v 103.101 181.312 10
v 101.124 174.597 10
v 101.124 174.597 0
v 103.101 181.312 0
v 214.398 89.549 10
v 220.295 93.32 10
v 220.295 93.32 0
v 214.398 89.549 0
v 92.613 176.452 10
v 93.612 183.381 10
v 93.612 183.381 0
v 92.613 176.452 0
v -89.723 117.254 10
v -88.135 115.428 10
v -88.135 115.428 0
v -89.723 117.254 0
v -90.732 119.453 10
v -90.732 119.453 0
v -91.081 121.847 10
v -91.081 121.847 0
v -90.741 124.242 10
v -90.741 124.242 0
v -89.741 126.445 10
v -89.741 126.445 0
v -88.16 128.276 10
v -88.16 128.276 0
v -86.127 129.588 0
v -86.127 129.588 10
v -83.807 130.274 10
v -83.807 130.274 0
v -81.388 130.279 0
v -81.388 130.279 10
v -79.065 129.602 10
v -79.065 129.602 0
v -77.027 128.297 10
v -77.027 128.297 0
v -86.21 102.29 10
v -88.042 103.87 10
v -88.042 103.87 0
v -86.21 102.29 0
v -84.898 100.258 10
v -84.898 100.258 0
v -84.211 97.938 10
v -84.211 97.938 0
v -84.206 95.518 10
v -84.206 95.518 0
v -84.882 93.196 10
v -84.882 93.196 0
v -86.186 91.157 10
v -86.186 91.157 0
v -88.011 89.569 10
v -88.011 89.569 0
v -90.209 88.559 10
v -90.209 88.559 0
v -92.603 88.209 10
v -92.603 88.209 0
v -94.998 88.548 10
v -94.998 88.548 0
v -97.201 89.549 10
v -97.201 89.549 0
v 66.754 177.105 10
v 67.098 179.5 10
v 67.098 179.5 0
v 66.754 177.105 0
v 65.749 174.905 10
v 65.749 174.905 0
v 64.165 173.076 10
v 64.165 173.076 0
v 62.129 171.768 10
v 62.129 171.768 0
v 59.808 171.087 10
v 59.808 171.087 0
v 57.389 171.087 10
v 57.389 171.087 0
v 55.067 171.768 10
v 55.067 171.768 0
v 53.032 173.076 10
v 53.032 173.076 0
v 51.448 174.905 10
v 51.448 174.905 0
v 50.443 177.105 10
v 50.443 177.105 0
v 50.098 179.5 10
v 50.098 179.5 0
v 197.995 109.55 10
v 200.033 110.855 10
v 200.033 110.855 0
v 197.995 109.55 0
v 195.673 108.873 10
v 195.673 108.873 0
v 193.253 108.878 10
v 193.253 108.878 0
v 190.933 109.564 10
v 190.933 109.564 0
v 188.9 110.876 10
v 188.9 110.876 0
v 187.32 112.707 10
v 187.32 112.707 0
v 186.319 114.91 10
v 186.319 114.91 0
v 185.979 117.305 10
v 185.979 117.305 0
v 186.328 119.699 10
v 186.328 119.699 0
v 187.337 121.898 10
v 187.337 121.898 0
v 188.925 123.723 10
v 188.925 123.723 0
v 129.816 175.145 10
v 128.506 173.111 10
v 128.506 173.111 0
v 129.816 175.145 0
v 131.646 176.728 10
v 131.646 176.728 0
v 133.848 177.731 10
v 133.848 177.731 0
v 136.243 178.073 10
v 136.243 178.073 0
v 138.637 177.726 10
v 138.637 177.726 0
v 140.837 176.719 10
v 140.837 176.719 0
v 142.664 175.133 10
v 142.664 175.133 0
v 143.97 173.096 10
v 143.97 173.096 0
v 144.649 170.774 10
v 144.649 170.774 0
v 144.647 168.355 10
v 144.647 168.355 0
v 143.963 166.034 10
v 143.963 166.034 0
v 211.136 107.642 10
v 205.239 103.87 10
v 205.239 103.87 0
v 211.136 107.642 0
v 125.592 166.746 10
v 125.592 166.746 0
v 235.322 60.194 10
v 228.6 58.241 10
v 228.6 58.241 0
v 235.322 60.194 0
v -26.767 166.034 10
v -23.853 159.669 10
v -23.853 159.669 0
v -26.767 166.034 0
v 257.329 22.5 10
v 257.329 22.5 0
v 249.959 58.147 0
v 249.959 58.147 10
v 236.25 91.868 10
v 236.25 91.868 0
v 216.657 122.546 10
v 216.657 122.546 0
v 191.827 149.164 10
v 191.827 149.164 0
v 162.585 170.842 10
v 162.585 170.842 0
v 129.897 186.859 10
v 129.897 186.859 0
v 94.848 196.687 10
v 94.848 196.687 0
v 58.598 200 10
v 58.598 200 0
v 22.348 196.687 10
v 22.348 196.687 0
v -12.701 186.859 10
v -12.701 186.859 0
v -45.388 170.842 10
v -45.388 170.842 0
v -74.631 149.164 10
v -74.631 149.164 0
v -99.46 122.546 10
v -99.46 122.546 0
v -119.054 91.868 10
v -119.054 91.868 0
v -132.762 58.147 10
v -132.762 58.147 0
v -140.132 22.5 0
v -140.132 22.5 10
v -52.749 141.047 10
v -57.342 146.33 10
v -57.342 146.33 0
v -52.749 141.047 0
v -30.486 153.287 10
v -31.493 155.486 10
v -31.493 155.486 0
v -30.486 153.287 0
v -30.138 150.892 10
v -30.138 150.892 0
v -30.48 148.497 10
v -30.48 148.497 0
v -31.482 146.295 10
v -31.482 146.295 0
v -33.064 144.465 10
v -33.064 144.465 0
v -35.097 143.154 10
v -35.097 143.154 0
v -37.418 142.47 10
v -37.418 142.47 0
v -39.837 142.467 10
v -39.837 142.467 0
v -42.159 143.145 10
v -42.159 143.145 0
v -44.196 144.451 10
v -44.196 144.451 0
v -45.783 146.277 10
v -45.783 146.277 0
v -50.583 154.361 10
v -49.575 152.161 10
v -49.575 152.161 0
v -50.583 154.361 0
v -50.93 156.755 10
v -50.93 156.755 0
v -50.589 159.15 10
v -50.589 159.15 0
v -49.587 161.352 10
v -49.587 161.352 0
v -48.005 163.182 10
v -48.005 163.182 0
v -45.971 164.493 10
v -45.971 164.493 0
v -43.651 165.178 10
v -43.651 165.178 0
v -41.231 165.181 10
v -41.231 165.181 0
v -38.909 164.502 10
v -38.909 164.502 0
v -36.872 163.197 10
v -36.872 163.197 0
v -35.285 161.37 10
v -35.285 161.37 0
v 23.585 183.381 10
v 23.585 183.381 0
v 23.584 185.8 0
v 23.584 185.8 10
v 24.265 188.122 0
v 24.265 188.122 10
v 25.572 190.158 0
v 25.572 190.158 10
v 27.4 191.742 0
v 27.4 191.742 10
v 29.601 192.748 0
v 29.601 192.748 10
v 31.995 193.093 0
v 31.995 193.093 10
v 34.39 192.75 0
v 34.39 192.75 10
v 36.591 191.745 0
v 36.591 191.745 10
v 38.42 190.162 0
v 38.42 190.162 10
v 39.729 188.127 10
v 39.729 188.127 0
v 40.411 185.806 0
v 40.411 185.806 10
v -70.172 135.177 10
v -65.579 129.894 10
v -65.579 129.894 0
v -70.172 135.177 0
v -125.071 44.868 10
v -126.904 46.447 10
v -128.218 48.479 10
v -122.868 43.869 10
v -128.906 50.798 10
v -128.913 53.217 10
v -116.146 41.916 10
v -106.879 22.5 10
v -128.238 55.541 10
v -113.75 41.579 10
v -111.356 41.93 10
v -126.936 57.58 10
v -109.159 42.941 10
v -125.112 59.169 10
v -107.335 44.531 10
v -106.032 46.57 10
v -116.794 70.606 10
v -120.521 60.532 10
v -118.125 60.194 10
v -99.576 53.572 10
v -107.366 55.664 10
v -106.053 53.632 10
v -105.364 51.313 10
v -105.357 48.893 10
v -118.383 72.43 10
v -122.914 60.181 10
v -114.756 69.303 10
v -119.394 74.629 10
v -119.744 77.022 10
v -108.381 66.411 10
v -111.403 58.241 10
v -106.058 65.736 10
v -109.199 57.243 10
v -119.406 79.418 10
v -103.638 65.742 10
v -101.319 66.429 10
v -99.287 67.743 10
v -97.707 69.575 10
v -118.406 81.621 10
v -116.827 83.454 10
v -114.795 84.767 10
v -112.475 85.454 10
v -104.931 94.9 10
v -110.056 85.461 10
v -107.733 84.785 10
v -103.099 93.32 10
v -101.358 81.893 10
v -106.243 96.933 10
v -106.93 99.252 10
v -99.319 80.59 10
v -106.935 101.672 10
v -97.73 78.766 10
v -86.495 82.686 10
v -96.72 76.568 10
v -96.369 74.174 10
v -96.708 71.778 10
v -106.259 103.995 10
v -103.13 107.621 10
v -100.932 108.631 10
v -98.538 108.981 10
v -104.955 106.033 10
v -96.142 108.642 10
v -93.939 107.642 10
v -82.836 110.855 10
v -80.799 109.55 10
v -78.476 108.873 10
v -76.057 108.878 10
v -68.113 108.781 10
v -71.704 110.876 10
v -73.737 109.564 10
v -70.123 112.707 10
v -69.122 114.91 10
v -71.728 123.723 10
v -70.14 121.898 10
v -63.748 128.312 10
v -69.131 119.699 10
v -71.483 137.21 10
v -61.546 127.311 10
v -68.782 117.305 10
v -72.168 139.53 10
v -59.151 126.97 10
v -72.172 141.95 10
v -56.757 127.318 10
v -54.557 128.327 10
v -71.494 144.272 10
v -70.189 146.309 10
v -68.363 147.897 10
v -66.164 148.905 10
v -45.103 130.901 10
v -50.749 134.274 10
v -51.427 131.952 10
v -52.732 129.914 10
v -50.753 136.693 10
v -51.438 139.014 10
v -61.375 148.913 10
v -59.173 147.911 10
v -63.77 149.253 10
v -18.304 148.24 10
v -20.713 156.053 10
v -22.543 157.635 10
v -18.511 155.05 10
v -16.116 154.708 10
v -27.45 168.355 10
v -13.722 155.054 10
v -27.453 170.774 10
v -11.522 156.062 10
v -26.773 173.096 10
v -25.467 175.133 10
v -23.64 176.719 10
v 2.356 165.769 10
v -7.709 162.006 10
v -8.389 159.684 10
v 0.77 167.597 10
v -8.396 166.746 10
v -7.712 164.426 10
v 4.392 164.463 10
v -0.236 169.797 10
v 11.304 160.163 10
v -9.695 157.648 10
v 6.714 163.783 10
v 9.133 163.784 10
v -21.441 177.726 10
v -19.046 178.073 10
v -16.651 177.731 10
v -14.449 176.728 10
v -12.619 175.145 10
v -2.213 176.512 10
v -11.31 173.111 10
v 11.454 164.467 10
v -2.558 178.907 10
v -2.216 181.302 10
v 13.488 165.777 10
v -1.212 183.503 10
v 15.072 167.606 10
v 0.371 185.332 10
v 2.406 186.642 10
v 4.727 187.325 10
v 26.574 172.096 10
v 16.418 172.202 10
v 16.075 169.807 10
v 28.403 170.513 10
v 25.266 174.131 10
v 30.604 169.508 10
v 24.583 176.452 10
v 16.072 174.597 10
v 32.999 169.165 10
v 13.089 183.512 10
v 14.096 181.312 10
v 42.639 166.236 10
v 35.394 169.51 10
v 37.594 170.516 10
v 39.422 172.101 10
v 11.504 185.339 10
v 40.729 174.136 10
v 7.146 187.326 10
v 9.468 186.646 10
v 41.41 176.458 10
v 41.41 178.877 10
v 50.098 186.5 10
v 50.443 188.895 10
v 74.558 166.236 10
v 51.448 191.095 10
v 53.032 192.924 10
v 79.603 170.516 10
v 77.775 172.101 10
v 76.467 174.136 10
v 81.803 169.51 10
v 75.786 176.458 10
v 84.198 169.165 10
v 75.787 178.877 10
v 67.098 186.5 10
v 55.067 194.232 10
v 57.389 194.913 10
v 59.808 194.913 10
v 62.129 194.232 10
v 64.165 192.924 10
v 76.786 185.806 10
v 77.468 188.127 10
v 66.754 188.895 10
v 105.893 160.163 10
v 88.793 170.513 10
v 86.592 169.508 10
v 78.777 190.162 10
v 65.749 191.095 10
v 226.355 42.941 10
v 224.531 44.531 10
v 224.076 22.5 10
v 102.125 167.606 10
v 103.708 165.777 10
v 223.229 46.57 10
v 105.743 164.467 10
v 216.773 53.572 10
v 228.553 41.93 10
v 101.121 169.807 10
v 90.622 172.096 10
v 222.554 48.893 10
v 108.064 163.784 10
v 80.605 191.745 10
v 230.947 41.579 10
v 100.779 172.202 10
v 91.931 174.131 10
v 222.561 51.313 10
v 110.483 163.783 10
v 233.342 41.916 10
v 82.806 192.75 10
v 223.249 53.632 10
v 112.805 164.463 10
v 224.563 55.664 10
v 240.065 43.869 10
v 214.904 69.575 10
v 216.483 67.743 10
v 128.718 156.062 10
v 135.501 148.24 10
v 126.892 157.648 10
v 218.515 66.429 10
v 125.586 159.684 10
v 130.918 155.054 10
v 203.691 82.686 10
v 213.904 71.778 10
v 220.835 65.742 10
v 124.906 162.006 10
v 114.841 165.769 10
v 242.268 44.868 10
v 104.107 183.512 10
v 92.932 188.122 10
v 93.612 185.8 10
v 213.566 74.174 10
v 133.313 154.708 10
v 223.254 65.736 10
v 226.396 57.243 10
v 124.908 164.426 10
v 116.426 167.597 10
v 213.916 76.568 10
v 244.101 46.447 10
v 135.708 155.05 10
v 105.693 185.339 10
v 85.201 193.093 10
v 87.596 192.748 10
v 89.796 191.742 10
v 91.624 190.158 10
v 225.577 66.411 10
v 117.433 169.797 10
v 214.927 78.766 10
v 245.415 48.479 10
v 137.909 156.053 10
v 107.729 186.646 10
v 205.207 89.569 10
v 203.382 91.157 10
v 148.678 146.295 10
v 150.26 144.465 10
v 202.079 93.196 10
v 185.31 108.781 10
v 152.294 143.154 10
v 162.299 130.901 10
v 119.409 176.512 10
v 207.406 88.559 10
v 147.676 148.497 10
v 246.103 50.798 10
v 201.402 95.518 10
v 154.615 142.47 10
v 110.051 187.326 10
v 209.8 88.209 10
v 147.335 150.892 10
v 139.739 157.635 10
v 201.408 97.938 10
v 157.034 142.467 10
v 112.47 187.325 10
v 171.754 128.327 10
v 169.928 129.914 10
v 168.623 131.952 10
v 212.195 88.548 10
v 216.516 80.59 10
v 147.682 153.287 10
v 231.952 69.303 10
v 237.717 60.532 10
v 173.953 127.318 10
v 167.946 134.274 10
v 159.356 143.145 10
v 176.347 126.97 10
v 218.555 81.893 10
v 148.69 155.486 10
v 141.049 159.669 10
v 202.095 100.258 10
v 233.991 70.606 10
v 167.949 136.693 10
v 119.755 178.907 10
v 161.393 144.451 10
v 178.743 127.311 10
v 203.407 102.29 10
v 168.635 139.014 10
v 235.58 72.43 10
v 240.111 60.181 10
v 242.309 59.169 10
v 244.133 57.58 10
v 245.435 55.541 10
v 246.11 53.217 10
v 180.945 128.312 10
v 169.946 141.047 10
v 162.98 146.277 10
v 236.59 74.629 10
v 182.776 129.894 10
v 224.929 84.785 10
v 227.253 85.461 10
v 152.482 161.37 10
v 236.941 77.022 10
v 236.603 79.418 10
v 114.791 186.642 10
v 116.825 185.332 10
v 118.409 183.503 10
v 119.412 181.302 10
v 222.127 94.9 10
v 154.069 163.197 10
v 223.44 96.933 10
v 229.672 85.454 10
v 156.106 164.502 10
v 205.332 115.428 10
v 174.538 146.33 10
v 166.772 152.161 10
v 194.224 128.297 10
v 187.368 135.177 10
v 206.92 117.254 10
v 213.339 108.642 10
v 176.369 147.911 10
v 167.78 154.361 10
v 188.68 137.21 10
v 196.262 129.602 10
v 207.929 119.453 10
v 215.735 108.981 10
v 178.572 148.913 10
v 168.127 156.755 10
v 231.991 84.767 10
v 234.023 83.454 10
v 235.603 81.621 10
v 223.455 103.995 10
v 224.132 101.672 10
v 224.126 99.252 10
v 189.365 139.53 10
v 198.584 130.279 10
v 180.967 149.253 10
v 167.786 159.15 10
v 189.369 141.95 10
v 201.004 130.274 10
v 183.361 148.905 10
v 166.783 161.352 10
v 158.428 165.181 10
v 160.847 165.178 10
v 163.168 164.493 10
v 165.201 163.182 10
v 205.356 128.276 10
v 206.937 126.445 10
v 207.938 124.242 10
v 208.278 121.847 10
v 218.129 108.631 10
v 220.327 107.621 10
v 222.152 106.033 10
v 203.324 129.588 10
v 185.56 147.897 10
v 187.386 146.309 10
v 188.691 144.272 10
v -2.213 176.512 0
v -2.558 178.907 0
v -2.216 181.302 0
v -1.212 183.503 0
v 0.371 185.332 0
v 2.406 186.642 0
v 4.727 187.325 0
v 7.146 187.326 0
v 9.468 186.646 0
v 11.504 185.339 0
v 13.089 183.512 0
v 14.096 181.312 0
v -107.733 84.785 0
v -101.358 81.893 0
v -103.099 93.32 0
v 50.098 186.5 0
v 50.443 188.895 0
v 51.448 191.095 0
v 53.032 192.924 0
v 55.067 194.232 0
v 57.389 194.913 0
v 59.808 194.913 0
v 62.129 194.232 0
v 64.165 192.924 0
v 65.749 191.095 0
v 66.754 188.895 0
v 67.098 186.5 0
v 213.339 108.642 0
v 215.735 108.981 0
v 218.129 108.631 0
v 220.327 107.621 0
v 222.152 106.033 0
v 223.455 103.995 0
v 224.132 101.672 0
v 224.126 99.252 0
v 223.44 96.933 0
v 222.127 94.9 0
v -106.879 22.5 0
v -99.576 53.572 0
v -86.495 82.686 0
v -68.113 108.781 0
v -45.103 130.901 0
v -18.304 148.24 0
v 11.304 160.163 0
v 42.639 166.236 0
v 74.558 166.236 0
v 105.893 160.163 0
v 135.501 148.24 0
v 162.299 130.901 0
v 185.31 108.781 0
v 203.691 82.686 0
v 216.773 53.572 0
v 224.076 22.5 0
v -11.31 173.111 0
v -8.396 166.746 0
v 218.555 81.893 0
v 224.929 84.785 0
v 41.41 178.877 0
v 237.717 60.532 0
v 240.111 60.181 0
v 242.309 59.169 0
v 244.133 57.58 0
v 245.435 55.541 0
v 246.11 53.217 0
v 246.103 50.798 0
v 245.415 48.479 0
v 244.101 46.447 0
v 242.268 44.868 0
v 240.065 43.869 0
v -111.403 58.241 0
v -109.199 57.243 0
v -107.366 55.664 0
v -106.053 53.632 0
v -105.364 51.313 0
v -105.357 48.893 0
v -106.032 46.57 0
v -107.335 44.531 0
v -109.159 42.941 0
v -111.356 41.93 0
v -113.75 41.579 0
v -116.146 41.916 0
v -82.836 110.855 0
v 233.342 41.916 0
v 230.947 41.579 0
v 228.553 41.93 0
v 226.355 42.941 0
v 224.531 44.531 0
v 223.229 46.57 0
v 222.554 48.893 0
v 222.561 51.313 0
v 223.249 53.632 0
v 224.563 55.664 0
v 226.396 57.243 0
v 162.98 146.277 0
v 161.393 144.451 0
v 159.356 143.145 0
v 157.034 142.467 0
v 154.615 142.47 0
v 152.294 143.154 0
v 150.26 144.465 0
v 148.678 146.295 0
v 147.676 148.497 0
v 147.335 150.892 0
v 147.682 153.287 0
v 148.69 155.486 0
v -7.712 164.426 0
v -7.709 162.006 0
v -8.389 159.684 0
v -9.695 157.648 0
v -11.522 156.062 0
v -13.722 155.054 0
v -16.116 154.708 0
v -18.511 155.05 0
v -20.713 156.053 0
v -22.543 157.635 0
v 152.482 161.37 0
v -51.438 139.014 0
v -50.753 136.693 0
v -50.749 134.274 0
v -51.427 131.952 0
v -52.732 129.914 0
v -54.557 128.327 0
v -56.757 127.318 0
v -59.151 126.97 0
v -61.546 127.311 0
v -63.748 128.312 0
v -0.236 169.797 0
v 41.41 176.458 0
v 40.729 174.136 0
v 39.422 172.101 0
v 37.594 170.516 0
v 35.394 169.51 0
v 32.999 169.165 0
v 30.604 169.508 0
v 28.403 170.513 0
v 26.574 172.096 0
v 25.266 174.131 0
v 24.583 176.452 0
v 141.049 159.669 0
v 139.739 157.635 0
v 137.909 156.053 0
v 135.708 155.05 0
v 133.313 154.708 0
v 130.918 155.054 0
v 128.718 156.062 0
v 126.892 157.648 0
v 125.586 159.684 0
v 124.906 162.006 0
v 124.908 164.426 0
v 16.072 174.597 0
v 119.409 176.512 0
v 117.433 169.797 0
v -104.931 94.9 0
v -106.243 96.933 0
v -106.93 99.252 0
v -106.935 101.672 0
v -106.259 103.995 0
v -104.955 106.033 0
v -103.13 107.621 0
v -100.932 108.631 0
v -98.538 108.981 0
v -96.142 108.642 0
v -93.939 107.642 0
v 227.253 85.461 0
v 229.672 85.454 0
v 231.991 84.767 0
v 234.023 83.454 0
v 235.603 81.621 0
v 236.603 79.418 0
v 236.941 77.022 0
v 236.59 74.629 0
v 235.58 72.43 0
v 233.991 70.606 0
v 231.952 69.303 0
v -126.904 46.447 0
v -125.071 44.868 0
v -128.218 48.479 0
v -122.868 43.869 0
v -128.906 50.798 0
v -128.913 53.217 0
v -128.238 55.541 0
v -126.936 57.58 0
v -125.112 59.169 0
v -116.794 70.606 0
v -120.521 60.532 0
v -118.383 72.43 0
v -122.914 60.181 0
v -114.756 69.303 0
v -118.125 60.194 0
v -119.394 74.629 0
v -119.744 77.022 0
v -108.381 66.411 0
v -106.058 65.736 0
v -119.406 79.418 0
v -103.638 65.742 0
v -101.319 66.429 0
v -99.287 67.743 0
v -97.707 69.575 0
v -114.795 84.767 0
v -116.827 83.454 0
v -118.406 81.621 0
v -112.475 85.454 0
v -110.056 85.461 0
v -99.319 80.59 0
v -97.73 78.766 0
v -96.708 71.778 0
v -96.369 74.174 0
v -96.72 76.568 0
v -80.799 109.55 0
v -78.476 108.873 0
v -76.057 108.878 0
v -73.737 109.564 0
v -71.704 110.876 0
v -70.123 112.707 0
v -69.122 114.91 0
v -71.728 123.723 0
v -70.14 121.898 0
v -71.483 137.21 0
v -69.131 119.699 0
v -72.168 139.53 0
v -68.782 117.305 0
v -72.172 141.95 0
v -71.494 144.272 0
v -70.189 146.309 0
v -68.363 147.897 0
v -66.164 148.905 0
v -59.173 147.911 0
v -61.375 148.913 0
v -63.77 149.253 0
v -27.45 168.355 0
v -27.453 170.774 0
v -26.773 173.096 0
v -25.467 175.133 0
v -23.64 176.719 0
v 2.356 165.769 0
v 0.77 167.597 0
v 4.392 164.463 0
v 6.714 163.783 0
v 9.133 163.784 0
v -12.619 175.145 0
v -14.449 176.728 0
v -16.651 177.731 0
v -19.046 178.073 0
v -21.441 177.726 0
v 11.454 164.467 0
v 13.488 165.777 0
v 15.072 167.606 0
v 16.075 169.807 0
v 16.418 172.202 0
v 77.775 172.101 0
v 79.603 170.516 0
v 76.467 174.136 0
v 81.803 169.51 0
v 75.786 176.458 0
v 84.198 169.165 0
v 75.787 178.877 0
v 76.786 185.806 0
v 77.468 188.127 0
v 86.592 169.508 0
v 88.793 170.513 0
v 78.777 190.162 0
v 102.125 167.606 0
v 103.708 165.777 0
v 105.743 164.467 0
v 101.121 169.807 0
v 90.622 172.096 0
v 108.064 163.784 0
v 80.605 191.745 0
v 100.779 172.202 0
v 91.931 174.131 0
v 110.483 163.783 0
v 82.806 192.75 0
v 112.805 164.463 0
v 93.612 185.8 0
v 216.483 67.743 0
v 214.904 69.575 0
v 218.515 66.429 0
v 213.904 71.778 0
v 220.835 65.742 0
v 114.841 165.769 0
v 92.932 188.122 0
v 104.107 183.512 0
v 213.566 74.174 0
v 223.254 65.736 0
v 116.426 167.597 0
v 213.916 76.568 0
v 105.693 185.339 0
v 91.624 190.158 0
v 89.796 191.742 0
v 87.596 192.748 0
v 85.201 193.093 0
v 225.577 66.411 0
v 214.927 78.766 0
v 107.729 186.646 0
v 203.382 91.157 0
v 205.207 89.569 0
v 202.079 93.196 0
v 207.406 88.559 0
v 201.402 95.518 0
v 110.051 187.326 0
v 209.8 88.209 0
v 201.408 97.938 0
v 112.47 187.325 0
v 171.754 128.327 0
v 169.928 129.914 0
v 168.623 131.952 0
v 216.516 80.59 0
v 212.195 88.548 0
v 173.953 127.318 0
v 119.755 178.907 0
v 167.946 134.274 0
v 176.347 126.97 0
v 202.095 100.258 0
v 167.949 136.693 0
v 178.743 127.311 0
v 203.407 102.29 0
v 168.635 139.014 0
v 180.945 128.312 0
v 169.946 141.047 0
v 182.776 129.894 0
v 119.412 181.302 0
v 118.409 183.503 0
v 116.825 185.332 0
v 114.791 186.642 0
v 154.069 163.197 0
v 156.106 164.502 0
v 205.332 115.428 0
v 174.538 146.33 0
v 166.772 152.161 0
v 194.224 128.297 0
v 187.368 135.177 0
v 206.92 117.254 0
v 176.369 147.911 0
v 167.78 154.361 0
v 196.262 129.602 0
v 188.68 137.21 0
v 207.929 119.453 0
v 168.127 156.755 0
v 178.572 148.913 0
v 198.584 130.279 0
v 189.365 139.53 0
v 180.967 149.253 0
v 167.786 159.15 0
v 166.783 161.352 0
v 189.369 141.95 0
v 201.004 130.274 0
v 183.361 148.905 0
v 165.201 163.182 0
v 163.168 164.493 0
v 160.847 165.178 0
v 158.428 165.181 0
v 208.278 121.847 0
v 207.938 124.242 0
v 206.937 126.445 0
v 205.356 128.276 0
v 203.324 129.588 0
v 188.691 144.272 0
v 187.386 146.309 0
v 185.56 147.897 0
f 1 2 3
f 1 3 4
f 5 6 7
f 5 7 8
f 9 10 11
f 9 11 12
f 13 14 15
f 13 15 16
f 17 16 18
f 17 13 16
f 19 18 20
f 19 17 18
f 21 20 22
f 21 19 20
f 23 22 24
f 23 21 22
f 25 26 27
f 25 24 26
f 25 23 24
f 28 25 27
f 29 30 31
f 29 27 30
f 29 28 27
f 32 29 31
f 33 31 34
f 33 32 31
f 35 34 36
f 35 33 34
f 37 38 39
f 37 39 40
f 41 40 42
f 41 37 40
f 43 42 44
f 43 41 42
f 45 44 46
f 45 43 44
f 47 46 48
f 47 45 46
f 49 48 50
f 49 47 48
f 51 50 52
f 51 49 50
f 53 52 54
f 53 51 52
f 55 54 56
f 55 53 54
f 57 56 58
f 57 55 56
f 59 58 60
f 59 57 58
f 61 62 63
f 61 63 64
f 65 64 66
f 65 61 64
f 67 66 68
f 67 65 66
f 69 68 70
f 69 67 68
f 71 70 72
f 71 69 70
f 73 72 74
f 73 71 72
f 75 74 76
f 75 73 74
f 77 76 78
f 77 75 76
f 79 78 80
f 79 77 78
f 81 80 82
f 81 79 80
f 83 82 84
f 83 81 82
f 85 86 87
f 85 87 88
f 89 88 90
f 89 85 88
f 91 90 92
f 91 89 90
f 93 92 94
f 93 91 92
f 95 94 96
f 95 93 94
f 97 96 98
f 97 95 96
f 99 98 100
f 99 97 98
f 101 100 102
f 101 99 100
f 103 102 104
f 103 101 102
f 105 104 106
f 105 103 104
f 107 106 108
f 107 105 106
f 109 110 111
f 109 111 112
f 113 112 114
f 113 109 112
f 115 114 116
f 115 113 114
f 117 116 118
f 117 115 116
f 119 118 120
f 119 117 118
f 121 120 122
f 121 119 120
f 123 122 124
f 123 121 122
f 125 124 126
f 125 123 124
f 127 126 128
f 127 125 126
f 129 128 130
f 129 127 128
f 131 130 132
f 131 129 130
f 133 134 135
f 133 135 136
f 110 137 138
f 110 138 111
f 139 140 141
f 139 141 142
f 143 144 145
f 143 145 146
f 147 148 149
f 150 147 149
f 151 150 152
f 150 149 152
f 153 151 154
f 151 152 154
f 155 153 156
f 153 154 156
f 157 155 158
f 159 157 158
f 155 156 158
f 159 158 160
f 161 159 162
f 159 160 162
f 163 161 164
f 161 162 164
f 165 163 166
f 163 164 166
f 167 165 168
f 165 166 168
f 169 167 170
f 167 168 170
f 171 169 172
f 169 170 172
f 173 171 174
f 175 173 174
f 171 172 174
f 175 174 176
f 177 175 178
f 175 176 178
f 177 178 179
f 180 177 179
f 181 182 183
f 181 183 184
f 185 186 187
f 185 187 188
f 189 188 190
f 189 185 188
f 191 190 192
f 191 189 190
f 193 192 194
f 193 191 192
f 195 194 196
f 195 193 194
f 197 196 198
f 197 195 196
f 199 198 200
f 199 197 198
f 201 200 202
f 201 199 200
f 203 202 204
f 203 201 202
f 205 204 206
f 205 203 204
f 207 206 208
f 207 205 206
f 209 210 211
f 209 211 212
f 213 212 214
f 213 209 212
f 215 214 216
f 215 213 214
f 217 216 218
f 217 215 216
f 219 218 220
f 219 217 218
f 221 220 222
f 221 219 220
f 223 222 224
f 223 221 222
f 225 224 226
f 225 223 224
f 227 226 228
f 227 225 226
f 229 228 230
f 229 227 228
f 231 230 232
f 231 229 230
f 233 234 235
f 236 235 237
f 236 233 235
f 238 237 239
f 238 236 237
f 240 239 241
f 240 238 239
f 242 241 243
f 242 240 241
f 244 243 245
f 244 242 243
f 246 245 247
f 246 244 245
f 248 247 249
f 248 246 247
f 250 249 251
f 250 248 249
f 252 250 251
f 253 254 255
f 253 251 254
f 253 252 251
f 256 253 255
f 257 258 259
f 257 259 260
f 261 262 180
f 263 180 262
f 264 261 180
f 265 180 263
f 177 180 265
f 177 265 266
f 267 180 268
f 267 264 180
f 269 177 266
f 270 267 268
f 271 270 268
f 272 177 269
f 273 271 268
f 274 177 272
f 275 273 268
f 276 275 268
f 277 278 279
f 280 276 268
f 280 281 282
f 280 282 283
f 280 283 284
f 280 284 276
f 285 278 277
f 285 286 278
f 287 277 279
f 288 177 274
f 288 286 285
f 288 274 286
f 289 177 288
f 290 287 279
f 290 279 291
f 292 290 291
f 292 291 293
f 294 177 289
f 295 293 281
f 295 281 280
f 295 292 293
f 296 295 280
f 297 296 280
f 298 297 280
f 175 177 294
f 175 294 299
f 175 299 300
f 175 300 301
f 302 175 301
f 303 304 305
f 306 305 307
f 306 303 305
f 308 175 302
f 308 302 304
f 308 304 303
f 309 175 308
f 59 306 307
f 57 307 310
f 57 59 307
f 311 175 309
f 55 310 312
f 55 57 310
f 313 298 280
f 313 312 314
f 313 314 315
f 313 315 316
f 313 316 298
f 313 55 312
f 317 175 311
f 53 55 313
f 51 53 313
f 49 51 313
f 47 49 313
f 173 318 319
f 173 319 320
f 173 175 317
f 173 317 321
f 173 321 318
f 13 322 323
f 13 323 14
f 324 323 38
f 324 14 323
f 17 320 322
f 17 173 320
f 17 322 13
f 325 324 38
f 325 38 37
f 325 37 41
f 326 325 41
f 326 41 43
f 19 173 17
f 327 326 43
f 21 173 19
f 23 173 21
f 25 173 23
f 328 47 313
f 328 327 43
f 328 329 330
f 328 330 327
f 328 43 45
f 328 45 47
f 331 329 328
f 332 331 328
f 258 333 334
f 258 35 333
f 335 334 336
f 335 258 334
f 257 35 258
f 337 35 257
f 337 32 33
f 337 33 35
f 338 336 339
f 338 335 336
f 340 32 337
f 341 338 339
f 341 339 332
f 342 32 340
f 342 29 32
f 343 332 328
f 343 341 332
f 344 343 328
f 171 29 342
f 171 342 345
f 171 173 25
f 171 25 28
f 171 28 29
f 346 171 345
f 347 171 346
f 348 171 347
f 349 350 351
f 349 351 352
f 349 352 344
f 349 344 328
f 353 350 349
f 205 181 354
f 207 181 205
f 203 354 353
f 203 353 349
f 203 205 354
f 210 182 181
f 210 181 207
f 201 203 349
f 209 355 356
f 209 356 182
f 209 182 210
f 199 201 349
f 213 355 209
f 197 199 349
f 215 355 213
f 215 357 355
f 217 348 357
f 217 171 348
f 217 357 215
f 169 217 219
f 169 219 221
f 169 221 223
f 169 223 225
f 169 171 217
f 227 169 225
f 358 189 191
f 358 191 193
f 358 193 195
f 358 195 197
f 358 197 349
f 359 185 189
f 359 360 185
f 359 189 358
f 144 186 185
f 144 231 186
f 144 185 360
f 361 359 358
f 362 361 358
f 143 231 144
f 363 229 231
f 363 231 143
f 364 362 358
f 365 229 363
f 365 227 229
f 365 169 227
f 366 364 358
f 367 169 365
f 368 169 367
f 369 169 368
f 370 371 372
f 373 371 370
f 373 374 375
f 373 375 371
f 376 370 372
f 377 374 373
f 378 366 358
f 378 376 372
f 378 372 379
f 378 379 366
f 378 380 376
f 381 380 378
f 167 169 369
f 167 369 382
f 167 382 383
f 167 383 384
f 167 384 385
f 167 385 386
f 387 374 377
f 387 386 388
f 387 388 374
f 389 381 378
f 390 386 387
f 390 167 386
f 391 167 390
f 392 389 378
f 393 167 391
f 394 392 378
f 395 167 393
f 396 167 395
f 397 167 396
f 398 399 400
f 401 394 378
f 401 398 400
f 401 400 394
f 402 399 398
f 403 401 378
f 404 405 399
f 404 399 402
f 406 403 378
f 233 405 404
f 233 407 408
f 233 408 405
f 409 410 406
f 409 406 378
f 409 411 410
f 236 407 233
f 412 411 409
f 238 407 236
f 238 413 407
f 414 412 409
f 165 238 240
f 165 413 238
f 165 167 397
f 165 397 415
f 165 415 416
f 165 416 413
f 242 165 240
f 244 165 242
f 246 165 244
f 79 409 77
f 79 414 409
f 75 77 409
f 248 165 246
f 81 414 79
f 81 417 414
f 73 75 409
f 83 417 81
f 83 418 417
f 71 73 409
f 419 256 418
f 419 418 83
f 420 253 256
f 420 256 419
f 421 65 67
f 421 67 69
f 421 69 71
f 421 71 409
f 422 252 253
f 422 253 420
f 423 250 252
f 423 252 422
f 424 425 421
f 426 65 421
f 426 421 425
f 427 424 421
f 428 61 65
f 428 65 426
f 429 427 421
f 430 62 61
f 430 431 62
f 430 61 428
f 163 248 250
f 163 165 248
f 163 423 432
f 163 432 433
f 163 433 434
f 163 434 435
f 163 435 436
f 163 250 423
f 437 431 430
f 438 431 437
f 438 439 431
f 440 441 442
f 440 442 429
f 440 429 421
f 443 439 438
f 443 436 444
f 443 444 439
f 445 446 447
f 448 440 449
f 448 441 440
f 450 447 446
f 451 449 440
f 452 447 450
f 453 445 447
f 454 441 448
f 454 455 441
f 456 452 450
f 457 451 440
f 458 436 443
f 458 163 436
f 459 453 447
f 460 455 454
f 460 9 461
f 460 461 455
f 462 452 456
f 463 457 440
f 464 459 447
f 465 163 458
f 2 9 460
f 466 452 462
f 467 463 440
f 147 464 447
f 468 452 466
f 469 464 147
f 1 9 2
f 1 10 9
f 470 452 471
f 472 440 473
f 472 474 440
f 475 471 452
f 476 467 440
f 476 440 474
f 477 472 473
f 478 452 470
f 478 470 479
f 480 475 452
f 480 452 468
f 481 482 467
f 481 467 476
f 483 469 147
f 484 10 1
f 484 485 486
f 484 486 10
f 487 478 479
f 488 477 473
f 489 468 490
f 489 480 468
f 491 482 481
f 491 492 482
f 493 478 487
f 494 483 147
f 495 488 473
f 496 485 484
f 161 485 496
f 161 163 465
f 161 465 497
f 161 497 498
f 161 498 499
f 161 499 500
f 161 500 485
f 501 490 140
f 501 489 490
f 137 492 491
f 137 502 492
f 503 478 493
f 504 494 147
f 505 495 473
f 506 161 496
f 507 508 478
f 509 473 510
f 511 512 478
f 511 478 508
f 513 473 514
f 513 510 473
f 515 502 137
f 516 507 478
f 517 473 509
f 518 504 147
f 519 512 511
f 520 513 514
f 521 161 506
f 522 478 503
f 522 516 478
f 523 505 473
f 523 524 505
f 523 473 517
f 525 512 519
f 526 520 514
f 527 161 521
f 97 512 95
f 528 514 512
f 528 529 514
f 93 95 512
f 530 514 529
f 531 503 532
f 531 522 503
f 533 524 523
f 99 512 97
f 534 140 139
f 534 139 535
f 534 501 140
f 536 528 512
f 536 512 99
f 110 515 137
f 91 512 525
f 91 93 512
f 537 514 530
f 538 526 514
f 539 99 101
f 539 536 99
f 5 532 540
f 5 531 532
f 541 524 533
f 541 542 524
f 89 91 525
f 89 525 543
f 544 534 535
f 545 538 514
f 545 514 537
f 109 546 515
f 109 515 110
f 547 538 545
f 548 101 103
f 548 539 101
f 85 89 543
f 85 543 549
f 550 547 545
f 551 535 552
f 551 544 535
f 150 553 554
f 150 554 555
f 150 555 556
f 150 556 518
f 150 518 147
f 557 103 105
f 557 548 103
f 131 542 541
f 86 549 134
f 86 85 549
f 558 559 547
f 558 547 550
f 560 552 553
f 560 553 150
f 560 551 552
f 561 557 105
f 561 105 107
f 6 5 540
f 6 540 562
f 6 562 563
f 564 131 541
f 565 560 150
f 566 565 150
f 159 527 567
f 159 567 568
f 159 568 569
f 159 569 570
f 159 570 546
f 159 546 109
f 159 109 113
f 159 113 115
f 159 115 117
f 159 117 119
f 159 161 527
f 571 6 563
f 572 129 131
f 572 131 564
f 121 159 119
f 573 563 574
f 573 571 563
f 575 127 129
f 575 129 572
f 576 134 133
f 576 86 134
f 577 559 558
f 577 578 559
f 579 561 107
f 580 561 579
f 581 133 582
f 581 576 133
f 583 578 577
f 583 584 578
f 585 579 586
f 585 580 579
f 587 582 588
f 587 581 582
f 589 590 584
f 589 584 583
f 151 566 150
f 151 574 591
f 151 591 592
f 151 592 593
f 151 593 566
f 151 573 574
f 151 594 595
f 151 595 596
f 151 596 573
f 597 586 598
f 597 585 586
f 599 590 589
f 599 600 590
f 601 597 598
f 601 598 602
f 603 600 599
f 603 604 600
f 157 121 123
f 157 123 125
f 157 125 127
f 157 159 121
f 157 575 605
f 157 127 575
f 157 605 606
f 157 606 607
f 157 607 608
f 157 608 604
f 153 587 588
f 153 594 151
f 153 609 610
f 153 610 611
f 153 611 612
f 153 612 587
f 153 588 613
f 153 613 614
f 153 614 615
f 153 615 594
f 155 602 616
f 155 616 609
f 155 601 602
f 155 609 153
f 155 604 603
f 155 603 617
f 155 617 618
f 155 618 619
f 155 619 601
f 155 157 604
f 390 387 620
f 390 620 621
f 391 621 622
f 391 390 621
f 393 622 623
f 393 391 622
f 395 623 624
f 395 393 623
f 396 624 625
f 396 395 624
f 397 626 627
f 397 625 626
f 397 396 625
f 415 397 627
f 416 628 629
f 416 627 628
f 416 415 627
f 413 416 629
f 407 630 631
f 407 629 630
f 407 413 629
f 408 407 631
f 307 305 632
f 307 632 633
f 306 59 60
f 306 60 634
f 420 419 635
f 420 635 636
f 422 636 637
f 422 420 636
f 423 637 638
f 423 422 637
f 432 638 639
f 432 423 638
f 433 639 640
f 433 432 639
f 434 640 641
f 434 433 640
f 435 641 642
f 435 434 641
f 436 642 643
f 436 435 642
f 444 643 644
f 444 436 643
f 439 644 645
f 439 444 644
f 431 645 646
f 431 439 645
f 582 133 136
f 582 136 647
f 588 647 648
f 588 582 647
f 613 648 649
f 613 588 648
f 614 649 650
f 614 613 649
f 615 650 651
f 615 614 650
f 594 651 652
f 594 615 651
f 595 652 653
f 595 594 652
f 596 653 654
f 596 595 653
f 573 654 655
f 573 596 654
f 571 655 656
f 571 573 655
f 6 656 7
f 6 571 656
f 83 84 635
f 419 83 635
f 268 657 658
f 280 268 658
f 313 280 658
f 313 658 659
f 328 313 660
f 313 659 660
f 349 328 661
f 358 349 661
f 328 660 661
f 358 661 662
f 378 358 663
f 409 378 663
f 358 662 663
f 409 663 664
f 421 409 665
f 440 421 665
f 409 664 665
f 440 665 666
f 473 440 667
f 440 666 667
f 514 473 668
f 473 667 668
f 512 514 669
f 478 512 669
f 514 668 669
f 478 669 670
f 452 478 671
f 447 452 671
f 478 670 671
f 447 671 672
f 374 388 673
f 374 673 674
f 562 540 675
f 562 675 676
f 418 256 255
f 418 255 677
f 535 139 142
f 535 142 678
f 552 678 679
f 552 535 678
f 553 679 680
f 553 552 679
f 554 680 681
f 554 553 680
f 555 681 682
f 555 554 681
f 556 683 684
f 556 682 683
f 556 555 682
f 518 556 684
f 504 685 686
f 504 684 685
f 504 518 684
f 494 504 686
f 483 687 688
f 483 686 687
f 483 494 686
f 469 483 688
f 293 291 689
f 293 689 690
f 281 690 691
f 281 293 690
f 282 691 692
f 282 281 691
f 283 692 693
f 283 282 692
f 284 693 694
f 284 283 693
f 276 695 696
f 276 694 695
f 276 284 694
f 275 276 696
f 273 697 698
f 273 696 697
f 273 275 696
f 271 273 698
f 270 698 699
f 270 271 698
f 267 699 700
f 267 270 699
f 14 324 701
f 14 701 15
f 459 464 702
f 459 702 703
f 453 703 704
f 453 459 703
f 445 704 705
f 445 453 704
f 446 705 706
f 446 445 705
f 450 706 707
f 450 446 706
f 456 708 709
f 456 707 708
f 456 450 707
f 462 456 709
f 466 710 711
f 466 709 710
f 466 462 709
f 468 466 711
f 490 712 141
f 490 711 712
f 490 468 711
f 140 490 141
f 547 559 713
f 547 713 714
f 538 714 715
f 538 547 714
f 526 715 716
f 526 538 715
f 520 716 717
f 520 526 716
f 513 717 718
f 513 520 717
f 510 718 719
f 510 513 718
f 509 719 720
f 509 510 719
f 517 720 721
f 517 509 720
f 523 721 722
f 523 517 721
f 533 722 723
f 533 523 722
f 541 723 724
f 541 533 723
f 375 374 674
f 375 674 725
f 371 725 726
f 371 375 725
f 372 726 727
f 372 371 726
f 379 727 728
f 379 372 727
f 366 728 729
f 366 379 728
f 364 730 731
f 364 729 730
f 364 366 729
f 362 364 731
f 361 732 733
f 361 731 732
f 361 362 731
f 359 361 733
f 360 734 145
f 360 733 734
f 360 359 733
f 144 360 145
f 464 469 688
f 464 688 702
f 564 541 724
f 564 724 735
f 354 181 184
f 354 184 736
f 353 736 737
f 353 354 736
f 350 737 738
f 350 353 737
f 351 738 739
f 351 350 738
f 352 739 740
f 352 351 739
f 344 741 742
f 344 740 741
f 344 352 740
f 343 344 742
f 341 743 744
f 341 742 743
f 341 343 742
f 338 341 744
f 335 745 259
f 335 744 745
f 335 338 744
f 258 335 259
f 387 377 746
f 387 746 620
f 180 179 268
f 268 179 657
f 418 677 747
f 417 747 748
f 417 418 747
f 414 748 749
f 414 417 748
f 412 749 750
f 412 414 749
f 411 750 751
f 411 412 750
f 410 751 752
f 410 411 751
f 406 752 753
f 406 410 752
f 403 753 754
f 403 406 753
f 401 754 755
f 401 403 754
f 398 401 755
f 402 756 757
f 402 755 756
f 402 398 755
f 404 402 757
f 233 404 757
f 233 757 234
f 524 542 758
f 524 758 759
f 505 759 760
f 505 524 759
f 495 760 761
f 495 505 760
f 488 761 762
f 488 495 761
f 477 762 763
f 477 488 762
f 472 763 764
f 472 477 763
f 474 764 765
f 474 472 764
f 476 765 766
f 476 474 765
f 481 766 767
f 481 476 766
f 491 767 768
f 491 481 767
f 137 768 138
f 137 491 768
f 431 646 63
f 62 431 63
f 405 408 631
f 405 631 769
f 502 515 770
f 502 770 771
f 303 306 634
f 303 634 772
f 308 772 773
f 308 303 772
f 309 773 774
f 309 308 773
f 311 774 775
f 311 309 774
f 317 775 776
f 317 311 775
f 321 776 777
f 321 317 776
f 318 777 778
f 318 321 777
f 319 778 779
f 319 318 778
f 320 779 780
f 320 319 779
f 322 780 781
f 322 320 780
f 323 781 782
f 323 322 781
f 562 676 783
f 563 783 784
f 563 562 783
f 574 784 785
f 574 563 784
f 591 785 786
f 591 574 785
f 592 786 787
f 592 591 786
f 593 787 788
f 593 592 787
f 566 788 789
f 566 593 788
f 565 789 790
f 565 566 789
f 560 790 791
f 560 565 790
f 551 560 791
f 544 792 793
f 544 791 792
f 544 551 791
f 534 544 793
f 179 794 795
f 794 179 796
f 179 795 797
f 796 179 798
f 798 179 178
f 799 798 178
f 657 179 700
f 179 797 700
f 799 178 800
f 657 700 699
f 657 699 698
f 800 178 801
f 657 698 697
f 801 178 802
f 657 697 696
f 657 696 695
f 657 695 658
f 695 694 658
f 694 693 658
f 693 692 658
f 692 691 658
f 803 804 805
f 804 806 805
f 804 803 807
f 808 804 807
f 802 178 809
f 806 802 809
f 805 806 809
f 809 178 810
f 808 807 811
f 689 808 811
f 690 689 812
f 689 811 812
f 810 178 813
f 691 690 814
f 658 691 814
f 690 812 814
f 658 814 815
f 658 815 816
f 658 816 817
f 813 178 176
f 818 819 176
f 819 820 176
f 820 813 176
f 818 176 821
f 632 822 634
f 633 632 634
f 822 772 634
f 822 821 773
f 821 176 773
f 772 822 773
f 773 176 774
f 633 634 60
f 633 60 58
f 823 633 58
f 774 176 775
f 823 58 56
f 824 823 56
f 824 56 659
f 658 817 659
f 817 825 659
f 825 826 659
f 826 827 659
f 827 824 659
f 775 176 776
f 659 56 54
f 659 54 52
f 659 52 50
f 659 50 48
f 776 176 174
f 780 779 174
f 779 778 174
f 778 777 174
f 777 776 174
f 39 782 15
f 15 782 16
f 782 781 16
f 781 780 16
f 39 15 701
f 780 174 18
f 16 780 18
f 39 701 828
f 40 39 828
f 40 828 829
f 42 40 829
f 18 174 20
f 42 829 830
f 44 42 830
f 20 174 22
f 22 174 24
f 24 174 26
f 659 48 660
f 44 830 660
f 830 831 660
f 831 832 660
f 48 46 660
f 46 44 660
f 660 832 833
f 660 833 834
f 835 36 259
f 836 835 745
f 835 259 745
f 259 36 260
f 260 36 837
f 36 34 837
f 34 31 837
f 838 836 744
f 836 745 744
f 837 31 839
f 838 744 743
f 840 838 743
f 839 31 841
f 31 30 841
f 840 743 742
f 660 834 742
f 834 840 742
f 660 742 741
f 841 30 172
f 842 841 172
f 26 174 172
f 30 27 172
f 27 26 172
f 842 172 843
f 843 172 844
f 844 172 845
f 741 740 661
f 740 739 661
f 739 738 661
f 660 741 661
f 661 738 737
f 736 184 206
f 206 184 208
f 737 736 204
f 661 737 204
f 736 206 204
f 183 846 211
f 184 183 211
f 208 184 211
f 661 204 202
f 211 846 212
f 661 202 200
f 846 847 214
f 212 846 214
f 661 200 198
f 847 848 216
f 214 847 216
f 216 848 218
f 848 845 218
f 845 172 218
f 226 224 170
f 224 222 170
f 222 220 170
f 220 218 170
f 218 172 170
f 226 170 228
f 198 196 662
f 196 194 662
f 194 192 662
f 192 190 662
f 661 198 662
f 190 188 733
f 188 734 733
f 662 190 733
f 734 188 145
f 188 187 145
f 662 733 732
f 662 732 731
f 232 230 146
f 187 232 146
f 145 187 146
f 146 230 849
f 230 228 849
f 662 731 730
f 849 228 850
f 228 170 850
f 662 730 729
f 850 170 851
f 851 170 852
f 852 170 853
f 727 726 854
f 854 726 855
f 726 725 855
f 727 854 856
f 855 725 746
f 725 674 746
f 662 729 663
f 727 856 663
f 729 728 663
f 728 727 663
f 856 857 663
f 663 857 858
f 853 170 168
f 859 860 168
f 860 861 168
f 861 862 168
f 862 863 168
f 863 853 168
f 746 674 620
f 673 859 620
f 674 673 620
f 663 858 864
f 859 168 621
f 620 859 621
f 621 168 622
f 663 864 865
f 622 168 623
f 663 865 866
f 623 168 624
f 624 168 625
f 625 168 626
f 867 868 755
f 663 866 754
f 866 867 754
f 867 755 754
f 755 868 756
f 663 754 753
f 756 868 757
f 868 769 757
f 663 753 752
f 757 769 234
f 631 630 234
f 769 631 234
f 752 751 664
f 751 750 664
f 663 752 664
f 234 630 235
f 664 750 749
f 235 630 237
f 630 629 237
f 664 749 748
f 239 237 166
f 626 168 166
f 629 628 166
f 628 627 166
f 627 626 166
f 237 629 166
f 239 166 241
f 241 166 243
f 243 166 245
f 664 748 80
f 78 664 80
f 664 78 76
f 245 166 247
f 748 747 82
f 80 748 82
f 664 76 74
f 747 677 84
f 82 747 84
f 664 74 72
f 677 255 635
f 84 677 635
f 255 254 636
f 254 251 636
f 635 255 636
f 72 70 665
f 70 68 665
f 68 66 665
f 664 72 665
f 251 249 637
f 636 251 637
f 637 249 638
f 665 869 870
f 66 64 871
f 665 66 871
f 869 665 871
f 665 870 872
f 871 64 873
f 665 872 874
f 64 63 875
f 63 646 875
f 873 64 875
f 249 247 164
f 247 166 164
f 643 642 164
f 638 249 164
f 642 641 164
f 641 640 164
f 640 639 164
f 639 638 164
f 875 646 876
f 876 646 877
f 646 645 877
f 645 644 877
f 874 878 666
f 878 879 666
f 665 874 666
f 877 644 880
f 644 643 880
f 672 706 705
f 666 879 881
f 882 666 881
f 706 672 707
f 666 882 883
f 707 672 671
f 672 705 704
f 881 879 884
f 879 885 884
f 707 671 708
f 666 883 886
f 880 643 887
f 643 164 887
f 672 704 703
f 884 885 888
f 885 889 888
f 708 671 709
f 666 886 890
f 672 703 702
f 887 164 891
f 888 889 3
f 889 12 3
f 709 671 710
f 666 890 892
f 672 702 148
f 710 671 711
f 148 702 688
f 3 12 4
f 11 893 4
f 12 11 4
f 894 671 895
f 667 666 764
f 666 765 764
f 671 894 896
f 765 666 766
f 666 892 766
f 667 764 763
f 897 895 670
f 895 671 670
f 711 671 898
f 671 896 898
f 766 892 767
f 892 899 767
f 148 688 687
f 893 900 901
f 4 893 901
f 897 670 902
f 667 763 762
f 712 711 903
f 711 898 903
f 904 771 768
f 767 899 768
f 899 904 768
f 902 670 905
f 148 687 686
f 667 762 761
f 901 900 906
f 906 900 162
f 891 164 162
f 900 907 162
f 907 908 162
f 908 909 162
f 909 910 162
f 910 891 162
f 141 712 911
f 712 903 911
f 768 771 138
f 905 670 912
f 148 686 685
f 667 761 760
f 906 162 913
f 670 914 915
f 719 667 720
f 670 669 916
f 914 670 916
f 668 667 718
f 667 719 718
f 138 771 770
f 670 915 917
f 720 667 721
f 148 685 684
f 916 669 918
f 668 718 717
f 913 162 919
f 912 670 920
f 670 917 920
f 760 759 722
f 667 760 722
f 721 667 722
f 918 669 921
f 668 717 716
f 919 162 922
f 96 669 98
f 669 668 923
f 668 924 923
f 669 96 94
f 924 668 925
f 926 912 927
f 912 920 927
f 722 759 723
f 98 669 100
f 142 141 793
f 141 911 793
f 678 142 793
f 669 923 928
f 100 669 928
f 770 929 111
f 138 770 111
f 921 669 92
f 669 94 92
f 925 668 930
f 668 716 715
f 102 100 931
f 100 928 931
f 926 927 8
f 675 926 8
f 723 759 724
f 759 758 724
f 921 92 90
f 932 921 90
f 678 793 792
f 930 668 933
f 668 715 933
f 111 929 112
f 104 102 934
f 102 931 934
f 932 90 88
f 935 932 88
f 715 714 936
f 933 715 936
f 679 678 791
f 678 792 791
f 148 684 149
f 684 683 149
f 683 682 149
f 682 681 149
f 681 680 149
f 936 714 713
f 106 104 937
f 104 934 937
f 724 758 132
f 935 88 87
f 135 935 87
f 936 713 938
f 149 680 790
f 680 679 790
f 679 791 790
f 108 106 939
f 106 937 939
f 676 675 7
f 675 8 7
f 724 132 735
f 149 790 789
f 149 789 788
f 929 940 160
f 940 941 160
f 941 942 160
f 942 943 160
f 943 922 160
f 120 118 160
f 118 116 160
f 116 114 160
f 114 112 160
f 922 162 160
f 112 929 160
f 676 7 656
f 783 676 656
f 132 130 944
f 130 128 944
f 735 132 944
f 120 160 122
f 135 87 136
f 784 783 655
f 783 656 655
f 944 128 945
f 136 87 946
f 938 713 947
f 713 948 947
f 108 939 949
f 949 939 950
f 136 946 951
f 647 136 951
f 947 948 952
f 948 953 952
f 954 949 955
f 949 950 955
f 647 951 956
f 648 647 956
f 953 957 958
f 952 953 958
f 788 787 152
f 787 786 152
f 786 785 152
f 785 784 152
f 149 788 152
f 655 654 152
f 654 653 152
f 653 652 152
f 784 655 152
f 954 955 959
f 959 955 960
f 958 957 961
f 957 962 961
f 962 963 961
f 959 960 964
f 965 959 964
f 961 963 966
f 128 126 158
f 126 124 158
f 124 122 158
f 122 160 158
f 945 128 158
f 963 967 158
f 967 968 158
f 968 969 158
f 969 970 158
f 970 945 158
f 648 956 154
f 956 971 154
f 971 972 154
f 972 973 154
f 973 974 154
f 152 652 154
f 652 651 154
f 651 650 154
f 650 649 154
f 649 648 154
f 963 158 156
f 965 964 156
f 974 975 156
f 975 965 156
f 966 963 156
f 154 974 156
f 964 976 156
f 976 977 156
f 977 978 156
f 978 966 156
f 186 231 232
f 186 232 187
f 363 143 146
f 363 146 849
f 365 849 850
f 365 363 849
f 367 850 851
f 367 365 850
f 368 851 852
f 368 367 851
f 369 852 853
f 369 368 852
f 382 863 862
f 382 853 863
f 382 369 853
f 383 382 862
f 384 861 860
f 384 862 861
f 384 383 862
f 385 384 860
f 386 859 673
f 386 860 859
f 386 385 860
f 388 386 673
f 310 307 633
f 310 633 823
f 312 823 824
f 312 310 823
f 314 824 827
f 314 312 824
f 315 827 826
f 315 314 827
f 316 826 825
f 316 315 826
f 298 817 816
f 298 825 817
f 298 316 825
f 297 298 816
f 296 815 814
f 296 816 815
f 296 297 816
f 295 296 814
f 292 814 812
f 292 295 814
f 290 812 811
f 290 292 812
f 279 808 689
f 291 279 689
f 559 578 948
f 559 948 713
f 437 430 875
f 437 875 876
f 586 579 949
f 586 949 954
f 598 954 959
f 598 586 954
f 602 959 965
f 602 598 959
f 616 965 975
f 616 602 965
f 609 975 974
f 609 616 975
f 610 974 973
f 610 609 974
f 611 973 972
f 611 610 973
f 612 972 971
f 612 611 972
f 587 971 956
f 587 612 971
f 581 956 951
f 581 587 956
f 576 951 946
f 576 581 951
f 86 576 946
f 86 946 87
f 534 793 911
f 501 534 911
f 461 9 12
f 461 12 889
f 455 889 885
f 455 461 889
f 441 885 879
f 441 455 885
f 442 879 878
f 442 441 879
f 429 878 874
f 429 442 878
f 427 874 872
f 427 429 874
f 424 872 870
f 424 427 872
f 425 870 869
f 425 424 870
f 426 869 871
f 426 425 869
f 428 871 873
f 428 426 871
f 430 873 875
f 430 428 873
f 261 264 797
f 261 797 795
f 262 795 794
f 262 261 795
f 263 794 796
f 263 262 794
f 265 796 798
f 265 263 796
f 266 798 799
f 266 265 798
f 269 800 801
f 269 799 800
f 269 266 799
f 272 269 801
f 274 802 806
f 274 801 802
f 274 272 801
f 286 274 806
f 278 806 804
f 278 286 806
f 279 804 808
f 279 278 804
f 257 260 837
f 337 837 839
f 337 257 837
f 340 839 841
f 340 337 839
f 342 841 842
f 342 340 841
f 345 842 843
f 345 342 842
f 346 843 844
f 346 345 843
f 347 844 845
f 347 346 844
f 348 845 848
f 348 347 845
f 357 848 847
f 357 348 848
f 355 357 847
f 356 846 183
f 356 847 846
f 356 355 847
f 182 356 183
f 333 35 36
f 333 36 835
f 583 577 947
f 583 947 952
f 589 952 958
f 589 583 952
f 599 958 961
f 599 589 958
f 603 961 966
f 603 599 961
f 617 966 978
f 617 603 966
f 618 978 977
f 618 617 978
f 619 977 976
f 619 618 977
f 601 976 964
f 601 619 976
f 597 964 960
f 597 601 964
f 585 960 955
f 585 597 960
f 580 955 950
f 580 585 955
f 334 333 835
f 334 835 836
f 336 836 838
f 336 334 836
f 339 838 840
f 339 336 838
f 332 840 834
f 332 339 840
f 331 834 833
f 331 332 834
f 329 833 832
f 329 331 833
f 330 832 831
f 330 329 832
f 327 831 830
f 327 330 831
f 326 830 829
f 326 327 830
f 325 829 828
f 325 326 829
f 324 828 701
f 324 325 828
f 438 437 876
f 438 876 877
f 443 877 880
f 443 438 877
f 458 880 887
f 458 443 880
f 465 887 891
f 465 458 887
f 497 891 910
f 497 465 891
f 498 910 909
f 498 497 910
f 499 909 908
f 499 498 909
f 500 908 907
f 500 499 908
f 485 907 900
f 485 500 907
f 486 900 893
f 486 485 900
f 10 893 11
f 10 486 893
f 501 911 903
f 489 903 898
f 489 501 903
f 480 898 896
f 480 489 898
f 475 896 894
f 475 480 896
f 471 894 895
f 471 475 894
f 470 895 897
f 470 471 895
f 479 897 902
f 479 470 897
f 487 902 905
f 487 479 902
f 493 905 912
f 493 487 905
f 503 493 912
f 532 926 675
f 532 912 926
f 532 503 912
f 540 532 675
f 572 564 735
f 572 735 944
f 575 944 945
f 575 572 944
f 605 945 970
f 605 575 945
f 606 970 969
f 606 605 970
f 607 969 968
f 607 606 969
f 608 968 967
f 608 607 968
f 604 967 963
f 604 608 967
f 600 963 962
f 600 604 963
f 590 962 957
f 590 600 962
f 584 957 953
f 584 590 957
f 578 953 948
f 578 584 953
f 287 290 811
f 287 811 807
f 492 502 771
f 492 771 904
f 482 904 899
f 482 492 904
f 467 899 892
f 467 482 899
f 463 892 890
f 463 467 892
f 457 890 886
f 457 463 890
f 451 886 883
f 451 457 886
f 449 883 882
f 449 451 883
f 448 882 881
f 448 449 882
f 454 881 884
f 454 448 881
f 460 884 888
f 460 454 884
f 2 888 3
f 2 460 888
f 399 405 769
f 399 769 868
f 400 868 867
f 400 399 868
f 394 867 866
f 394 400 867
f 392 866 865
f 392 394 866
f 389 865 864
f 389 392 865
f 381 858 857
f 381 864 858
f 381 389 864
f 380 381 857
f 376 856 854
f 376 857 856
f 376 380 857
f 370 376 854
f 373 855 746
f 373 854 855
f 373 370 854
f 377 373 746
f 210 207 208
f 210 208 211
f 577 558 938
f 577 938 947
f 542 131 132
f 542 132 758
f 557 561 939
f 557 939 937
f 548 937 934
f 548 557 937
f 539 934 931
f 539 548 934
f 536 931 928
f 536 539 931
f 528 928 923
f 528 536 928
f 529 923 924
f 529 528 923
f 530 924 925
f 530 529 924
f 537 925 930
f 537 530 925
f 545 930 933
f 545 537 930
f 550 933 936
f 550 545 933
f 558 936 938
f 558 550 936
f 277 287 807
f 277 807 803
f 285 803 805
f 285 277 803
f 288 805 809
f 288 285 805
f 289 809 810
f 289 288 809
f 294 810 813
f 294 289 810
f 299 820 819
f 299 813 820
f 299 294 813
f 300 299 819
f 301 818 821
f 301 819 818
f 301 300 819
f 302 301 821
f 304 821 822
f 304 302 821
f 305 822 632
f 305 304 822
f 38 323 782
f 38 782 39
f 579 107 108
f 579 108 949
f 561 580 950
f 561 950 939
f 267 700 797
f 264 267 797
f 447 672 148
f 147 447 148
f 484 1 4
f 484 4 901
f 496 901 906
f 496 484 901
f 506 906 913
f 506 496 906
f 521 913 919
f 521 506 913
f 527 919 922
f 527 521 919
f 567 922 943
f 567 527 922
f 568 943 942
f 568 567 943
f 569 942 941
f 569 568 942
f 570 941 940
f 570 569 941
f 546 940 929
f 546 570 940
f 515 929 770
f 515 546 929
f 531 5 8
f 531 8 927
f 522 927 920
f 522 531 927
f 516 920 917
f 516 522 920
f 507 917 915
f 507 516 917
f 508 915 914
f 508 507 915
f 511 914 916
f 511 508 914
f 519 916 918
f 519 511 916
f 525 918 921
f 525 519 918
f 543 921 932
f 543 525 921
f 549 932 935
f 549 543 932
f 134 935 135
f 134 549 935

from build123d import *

# Parameters (mm, degrees)
BOSS_EXTRU_1_DEPTH           = 10
ENL_V_MAT_EXTRU_1_DEPTH      = 11
R_P_TITION_CIRCULAIRE1_COUNT = 10
R_P_TITION_CIRCULAIRE1_ANGLE = 73.8
R_P_TITION_CIRCULAIRE2_COUNT = 10
R_P_TITION_CIRCULAIRE2_ANGLE = 73.8


with BuildPart() as part:
    # Esquisse1 → Boss.-Extru.1 (new body)
    with BuildSketch(Plane.XY):
        with BuildLine():
            Line((-140.132008959, 22.5), (-106.879003857, 22.5))
            ThreePointArc((-106.879003857, 22.5), (58.598335981, 167), (224.07567582, 22.5))
            Line((224.07567582, 22.5), (257.328680921, 22.5))
            ThreePointArc((257.328680921, 22.5), (58.598335981, 200), (-140.132008959, 22.5))
        make_face()
    extrude(amount=BOSS_EXTRU_1_DEPTH)

    # Esquisse2 → Enlèv. mat.-Extru.1 (cut, through all)
    with BuildSketch(Plane.XY.offset(10)):
        with BuildLine():
            Line((50.098335981, 179.5), (50.098335981, 186.5))
            ThreePointArc((50.098335981, 186.5), (58.598335981, 195), (67.098335981, 186.5))
            Line((67.098335981, 186.5), (67.098335981, 179.5))
            ThreePointArc((67.098335981, 179.5), (58.598335981, 171), (50.098335981, 179.5))
        make_face()
    enl_v_mat_extru_1 = extrude(amount=-ENL_V_MAT_EXTRU_1_DEPTH, mode=Mode.SUBTRACT)

    # Répétition circulaire1: Enlèv. mat.-Extru.1 ×10 about axis
    r_p_tition_circulaire1_axis = Axis((58.598335981, 0, 0), (0, 0, -1))
    for i in range(1, R_P_TITION_CIRCULAIRE1_COUNT):
        add(enl_v_mat_extru_1.rotate(r_p_tition_circulaire1_axis, i * R_P_TITION_CIRCULAIRE1_ANGLE / (R_P_TITION_CIRCULAIRE1_COUNT - 1)), mode=Mode.SUBTRACT)

    # Répétition circulaire2: Enlèv. mat.-Extru.1 ×10 about axis
    r_p_tition_circulaire2_axis = Axis((58.598335981, 0, 0), (0, 0, 1))
    for i in range(1, R_P_TITION_CIRCULAIRE2_COUNT):
        add(enl_v_mat_extru_1.rotate(r_p_tition_circulaire2_axis, i * R_P_TITION_CIRCULAIRE2_ANGLE / (R_P_TITION_CIRCULAIRE2_COUNT - 1)), mode=Mode.SUBTRACT)


solid = part.part
